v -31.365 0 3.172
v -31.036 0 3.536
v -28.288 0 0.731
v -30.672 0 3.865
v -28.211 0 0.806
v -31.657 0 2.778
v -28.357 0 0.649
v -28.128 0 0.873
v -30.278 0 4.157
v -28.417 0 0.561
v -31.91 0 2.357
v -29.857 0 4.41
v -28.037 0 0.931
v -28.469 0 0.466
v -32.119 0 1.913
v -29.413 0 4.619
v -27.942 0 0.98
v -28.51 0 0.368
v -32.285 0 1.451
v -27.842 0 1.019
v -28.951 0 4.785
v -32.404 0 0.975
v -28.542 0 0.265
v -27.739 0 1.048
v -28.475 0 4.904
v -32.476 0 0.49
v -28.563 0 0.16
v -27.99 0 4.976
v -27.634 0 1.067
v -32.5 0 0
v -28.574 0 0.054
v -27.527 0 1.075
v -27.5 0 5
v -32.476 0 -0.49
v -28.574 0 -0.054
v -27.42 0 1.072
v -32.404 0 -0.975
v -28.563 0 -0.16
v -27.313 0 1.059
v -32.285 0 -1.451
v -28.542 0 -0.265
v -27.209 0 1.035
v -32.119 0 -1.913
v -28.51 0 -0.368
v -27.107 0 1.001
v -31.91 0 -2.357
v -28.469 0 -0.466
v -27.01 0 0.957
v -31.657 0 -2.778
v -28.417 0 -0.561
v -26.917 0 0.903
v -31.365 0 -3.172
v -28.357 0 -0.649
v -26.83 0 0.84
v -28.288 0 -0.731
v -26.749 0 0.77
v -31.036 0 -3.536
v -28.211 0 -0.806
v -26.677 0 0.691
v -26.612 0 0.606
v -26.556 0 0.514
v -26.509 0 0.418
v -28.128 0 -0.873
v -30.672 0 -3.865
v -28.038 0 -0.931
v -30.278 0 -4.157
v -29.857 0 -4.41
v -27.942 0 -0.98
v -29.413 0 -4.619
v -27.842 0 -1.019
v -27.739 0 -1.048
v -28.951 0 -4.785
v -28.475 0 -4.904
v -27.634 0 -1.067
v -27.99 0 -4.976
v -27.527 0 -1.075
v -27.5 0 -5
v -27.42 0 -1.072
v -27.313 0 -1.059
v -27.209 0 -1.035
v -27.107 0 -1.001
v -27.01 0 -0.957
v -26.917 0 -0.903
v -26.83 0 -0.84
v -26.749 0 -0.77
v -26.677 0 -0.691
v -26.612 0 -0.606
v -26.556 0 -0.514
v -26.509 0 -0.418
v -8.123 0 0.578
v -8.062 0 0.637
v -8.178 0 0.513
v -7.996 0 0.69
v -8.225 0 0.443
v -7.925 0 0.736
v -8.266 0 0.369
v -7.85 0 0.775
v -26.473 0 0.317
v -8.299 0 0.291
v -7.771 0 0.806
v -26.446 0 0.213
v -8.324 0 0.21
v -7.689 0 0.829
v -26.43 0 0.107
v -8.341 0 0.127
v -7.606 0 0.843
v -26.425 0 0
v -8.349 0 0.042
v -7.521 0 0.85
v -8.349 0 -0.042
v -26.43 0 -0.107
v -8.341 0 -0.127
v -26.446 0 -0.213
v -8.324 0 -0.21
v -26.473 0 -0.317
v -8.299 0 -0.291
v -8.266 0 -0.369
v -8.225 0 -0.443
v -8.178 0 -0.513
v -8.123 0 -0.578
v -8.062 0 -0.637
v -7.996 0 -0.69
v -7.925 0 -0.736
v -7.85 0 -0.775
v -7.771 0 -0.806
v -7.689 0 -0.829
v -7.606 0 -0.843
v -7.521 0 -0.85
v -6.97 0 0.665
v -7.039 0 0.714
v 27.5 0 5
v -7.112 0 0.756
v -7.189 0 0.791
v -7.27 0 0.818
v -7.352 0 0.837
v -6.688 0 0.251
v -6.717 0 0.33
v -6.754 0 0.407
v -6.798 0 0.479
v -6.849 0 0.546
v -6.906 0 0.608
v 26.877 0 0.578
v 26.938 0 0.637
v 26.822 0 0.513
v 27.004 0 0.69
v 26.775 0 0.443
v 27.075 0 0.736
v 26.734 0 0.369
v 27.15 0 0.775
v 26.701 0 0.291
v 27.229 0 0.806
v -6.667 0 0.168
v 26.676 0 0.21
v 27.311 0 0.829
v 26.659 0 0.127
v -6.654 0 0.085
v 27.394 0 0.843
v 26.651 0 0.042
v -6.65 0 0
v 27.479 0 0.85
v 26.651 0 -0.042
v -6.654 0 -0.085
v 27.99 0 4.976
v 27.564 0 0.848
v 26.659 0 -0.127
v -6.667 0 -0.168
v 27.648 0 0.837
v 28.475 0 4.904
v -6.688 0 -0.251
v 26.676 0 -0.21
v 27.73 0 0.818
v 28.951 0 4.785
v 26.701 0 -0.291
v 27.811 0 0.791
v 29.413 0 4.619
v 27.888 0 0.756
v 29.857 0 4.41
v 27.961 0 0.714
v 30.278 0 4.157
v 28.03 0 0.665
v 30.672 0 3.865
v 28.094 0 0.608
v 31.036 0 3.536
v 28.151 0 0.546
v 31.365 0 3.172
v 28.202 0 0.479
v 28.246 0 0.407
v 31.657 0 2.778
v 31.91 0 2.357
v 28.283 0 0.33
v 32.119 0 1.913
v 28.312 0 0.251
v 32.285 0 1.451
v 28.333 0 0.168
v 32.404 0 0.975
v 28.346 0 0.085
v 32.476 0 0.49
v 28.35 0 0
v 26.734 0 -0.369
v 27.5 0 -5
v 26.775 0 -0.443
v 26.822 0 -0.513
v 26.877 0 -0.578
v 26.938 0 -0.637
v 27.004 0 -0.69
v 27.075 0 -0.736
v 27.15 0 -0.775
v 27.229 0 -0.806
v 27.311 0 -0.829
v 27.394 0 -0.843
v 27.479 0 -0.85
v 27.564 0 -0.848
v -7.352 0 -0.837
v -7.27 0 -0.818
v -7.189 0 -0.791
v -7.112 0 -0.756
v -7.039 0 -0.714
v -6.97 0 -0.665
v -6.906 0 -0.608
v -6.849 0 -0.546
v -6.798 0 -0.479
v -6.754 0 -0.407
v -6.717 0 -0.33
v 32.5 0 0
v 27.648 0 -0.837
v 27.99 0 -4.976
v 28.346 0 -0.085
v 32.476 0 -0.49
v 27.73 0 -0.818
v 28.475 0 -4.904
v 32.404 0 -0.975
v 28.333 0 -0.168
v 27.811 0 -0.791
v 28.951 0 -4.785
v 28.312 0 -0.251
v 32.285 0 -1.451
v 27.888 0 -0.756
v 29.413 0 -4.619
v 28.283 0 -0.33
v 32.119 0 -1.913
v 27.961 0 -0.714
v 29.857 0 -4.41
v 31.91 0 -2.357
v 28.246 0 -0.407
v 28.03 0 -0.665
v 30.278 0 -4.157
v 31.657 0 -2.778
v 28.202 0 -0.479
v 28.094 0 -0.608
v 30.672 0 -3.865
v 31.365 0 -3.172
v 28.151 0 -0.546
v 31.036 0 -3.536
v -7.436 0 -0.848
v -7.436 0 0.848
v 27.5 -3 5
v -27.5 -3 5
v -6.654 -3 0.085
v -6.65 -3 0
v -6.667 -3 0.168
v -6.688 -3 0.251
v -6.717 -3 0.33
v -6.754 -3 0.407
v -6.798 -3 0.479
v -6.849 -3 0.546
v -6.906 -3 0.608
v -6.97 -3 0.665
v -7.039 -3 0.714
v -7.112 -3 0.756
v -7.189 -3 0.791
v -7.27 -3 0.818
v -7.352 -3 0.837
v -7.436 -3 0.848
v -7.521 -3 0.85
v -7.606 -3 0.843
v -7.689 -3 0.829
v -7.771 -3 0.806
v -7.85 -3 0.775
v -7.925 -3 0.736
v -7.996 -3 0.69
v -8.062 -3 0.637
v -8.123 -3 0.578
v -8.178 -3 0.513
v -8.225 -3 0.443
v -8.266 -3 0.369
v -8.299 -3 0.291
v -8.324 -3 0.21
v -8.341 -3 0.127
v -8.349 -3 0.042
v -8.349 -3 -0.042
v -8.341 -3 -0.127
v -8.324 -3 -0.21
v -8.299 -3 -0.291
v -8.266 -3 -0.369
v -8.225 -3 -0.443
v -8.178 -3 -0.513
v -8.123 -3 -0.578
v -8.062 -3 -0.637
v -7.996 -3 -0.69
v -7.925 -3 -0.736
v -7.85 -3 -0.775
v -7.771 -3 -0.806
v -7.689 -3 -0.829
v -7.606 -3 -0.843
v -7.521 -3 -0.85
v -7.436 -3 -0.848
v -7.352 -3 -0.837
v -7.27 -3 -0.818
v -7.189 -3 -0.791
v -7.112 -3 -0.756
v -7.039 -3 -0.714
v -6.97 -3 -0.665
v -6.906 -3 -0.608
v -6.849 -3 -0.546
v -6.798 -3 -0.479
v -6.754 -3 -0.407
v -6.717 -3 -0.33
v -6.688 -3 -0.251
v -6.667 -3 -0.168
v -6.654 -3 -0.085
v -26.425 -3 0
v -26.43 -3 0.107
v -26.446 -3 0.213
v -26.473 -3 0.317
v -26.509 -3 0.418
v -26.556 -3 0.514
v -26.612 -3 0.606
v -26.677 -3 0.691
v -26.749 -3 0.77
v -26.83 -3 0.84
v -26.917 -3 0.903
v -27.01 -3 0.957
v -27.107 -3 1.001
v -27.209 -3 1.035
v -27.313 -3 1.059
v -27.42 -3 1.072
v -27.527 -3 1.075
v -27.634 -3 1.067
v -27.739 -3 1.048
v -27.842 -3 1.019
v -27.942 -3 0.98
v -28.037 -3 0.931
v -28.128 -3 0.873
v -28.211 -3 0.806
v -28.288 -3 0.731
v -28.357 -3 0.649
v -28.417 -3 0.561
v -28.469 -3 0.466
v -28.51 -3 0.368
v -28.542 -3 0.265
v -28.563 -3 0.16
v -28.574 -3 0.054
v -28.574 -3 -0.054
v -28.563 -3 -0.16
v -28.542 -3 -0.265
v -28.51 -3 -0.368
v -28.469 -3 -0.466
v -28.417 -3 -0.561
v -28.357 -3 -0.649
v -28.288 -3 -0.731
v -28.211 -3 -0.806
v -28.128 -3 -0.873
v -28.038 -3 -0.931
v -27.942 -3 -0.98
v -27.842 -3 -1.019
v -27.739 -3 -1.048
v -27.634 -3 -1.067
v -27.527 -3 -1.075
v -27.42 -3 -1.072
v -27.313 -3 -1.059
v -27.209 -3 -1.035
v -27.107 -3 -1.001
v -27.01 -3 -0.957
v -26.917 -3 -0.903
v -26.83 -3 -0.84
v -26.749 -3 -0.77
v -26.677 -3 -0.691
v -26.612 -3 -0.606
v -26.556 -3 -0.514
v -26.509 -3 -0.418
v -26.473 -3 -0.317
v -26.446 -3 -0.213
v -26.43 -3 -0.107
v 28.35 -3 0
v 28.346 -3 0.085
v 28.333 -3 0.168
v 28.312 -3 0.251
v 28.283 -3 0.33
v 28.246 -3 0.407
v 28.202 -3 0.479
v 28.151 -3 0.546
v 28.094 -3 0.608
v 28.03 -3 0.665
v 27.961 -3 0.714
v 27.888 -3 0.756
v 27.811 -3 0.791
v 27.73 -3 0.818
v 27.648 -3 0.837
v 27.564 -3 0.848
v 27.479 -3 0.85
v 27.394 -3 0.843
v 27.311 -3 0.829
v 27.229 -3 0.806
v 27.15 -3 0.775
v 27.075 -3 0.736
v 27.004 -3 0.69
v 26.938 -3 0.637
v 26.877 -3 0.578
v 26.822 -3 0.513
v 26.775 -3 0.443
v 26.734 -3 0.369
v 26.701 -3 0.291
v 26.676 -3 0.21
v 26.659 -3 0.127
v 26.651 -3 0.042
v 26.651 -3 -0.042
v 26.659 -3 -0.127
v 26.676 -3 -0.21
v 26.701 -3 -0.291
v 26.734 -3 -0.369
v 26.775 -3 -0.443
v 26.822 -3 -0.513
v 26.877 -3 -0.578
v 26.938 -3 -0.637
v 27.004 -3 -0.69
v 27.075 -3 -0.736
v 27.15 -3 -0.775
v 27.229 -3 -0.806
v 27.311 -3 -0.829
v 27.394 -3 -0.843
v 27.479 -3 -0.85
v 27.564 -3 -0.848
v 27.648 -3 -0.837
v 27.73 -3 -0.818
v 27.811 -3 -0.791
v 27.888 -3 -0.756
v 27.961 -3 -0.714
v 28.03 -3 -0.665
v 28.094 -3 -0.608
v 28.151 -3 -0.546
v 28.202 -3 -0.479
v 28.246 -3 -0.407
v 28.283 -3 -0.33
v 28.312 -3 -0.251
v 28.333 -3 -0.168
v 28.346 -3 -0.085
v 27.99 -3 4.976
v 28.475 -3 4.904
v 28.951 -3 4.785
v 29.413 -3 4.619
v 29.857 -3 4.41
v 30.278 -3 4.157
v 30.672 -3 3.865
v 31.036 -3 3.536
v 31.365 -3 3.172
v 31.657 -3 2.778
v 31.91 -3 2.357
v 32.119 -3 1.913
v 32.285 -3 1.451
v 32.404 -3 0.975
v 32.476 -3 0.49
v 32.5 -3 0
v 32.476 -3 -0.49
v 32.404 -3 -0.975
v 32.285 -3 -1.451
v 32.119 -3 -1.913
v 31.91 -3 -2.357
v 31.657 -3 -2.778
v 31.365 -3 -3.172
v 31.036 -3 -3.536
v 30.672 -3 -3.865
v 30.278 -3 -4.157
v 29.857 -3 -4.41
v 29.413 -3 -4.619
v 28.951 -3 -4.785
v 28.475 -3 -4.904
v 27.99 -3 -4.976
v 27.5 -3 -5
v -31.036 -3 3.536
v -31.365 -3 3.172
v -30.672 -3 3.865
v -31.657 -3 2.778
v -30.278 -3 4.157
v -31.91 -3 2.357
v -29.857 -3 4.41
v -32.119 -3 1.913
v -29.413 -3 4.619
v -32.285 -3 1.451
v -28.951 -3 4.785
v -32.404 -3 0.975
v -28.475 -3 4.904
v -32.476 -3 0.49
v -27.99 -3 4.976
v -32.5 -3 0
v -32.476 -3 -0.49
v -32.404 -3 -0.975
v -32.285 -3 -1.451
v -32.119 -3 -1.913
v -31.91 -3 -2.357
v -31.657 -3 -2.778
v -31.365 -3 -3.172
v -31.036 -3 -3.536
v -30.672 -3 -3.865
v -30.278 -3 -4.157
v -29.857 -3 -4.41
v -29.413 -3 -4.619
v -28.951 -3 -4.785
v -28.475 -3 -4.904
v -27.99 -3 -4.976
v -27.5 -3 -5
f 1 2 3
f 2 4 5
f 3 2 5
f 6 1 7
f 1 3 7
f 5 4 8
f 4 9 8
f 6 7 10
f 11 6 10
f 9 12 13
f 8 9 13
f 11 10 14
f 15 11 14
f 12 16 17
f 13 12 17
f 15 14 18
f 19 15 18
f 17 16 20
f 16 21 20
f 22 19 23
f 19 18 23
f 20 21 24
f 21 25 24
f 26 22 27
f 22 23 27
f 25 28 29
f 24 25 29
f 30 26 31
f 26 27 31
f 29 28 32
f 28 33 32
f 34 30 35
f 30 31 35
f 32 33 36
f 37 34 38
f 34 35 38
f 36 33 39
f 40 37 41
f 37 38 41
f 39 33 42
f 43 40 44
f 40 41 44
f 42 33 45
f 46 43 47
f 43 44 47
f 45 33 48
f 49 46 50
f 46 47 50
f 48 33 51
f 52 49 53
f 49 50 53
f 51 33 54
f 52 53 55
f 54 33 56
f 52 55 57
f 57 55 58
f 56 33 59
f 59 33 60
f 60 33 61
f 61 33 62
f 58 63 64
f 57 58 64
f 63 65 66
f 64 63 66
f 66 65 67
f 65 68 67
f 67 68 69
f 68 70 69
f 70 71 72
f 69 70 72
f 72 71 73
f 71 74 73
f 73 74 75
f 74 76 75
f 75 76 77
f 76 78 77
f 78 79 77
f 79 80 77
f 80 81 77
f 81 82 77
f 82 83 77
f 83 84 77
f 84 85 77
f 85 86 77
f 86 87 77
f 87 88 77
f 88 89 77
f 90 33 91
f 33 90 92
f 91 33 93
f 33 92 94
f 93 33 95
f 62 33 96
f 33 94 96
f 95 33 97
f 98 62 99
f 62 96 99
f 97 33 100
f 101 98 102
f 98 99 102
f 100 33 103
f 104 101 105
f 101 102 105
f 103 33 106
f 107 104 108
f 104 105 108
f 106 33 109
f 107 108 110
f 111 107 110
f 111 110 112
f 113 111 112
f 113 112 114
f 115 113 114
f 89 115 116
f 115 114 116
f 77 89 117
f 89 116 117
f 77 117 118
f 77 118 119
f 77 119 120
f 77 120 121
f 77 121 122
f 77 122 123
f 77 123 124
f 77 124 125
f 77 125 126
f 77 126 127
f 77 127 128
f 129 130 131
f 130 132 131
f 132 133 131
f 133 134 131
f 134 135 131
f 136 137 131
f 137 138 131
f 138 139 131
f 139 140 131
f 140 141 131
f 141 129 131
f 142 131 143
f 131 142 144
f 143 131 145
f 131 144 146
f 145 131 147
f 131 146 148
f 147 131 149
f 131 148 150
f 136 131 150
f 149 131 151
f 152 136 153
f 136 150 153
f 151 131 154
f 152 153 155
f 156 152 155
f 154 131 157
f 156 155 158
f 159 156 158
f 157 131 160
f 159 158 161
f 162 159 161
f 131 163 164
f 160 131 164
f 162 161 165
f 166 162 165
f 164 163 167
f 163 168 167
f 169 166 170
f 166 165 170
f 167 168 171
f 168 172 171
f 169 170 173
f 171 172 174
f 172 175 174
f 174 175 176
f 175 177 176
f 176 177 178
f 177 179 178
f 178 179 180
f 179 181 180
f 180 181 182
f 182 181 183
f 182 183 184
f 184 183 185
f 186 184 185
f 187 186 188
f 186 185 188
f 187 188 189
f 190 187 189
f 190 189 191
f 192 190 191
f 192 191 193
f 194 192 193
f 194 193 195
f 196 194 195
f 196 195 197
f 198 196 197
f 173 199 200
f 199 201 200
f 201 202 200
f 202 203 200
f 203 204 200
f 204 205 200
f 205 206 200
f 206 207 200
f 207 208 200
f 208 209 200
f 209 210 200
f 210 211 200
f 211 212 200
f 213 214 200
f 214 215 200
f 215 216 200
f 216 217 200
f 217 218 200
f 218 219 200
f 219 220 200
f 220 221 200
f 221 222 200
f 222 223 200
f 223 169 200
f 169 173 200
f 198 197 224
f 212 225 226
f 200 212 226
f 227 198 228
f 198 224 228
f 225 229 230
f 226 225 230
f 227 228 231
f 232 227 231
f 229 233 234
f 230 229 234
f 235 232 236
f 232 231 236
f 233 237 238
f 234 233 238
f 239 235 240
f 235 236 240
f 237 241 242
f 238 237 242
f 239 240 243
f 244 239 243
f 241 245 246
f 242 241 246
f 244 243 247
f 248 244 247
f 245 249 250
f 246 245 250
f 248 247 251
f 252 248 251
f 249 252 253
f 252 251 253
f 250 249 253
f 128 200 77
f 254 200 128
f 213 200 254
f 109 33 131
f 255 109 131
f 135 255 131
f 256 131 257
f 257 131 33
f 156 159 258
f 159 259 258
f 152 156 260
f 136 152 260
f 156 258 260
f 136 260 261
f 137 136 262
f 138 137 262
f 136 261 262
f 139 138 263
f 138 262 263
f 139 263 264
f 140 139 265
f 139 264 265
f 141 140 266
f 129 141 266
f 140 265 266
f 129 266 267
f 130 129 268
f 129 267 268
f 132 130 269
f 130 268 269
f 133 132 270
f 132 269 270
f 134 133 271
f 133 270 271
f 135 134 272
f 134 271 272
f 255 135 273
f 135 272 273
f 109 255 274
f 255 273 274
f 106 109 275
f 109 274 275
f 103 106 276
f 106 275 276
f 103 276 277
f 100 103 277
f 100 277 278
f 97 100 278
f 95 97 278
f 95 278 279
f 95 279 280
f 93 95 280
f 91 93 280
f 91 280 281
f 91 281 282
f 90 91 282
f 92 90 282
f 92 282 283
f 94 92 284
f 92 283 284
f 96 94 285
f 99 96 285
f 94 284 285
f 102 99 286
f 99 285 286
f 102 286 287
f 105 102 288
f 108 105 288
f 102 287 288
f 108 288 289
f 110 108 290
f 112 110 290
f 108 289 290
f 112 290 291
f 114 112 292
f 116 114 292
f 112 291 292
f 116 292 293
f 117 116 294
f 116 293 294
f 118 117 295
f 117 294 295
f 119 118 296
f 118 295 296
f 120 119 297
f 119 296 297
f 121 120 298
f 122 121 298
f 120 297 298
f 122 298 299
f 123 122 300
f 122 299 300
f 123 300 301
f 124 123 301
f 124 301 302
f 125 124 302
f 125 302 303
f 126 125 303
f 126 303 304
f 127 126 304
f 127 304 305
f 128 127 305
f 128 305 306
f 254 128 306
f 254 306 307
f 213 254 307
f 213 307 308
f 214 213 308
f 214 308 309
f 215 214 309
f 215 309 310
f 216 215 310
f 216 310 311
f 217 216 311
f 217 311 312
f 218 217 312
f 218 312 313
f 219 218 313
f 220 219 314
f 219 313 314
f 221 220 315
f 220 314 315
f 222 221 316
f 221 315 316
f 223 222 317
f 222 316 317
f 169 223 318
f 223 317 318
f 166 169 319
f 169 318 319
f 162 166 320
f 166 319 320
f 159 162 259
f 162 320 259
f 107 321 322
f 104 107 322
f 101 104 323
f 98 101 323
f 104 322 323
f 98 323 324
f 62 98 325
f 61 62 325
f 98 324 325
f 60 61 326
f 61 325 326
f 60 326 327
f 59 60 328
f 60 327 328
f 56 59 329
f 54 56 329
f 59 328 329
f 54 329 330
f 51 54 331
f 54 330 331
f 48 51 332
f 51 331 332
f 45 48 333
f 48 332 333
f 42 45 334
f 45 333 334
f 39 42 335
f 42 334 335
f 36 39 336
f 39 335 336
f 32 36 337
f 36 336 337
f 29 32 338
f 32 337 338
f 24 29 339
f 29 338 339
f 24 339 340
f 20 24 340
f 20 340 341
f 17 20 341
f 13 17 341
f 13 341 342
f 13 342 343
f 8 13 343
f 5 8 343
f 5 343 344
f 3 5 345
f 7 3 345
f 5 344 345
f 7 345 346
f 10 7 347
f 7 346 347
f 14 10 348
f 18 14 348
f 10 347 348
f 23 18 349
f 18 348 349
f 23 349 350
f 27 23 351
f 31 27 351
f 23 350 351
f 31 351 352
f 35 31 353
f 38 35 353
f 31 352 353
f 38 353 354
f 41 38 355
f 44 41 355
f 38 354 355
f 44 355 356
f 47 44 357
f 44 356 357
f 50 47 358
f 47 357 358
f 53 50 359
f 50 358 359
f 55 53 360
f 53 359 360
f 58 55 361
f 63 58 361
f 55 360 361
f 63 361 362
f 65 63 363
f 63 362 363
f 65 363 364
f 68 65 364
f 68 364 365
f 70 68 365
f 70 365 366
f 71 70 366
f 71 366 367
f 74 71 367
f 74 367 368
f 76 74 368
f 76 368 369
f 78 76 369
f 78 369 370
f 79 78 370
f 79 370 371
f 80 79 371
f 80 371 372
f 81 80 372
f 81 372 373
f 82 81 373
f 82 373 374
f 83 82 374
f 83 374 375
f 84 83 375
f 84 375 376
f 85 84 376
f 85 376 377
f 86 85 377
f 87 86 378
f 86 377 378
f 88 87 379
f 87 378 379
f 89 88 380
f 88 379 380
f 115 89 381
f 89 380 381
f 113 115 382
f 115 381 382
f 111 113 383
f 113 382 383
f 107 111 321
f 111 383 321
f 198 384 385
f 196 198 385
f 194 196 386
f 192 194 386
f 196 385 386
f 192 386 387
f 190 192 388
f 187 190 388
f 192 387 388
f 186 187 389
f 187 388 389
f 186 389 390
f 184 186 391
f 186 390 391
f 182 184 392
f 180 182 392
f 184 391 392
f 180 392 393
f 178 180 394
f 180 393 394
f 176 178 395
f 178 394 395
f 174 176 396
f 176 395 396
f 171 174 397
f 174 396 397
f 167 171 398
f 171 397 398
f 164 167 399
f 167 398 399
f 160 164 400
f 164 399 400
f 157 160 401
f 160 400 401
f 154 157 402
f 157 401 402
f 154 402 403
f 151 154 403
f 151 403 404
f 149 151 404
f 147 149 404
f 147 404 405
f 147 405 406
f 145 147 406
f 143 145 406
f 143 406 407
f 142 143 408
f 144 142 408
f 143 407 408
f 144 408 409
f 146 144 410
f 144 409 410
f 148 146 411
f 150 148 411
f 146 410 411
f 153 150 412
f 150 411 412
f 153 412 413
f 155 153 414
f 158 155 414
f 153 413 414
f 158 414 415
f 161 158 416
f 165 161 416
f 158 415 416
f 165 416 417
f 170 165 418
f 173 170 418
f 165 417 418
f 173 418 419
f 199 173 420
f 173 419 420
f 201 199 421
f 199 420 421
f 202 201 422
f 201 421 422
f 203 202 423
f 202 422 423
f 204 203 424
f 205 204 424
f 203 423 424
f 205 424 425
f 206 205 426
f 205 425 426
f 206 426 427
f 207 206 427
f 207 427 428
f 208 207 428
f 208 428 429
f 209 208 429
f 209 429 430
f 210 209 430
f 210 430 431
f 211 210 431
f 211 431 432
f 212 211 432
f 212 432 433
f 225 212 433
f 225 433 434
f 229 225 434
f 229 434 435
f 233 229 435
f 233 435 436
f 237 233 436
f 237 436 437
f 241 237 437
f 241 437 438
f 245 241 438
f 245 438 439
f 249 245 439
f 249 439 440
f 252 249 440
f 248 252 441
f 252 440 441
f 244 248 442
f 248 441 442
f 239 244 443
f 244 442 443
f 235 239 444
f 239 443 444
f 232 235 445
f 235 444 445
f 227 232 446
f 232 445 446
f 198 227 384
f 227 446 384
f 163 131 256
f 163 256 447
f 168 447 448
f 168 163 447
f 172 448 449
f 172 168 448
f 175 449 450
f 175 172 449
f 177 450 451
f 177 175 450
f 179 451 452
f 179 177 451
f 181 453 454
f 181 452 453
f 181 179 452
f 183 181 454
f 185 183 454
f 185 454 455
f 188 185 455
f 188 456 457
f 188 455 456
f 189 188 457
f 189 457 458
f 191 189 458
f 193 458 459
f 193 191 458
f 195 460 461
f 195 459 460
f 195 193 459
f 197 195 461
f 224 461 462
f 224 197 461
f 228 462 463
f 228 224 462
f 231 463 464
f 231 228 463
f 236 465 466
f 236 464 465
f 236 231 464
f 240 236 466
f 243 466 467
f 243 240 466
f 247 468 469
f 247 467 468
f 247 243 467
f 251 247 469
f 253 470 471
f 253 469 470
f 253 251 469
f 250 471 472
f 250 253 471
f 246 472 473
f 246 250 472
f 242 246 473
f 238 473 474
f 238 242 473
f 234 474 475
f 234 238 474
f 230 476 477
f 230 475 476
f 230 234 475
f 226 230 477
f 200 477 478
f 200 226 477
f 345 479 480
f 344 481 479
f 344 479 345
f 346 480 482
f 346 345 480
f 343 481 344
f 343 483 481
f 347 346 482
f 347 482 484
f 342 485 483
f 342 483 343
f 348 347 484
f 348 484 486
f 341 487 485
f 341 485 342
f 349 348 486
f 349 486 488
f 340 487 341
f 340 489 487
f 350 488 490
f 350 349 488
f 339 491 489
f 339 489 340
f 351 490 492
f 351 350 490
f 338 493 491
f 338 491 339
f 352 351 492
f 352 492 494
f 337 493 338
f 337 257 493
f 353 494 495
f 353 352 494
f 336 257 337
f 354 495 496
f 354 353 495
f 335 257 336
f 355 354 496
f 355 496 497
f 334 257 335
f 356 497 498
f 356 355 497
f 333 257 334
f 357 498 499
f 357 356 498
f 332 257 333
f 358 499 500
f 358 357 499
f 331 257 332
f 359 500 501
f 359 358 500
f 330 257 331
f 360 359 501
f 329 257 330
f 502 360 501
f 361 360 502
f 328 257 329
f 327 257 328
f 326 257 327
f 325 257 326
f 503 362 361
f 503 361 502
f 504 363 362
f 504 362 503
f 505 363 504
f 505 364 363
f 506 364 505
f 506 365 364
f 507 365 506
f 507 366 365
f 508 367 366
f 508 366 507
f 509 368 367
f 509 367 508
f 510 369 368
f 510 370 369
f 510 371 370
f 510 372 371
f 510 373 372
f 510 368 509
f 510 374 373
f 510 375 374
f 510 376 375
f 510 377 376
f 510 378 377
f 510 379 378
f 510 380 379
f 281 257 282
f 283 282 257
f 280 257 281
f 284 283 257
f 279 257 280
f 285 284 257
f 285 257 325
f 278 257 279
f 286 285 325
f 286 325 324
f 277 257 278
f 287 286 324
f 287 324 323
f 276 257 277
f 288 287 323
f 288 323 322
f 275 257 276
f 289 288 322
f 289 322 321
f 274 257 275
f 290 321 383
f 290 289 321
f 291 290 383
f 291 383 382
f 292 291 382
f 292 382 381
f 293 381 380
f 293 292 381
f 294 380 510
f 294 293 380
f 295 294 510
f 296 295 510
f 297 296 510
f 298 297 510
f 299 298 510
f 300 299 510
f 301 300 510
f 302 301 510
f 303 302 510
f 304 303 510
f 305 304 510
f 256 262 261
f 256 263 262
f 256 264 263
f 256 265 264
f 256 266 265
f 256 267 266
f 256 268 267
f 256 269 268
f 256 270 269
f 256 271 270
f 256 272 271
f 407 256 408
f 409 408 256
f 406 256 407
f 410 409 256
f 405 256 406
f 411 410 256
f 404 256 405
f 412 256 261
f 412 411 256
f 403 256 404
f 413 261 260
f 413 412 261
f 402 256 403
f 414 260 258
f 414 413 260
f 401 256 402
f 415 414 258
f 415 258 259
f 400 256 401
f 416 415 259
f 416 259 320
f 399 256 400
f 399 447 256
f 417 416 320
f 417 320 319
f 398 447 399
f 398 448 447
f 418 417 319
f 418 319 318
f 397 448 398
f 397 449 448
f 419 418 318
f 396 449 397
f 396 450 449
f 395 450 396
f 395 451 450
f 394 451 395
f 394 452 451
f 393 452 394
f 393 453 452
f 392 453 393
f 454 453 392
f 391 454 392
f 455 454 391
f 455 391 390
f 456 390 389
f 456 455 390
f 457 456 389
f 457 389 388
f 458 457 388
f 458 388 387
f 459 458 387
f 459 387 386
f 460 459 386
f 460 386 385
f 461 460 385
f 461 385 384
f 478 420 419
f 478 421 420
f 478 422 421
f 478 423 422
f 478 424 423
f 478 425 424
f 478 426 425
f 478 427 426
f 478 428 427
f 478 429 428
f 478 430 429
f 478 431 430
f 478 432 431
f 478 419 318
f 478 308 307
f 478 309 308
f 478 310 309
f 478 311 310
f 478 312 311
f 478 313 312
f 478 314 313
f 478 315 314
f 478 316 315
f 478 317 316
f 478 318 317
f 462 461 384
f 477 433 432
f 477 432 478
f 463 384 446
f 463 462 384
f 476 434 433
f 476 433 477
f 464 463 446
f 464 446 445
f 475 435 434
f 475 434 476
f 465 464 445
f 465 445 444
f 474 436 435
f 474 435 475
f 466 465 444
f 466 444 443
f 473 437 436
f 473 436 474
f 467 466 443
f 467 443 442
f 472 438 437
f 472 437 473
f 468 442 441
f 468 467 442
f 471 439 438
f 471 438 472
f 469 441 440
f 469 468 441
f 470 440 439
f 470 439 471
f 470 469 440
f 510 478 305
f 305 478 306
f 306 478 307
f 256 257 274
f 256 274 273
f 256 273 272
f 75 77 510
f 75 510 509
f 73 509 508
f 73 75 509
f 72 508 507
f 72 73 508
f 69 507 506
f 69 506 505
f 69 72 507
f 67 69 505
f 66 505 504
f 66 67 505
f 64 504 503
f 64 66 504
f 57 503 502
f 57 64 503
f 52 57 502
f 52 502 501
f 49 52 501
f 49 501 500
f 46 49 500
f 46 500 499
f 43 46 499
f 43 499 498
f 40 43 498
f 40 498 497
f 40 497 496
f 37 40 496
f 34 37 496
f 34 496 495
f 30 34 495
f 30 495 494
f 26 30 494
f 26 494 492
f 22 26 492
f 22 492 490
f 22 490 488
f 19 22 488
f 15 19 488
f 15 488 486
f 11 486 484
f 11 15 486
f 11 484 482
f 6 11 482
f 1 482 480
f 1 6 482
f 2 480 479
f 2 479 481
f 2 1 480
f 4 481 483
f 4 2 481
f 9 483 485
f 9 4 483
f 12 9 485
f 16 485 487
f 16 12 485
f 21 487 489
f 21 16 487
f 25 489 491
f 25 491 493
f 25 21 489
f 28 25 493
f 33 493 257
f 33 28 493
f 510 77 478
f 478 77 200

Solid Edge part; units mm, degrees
sketch "Sketch1" plane through (0, 0, 0) normal (0, -1, 0) x (1, 0, 0)
  line L0 (-27.5, -5) -> (27.5, -5)
  arc A0 (27.5, -5) -> (27.5, 5) centre (27.5, 0) ccw
  line L1 (27.5, 5) -> (-27.5, 5)
  arc A1 (-27.5, -5) -> (-27.5, 5) centre (-27.5, 0) cw
  dimension "D1" = 10
  dimension "D2" = 55
extrude "Ajout_matière_1" add sketch "Sketch1" along normal blind 3
sketch "Sketch2" plane through (0, -3, 0) normal (0, -1, 0) x (1, 0, 0)
  circle A0 centre (-7.5, 0) radius 0.85
  circle A1 centre (-27.5, 0) radius 1.075
  circle A2 centre (27.5, 0) radius 0.85
  dimension "D1" = 1.7
  dimension "D2" = 1.7
  dimension "D3" = 20
  dimension "D4" = 2.15
extrude "Enlèvement_matière_1" cut sketch "Sketch2" against normal blind 215.5447
properties part number "16" material "MDF 3mm"
